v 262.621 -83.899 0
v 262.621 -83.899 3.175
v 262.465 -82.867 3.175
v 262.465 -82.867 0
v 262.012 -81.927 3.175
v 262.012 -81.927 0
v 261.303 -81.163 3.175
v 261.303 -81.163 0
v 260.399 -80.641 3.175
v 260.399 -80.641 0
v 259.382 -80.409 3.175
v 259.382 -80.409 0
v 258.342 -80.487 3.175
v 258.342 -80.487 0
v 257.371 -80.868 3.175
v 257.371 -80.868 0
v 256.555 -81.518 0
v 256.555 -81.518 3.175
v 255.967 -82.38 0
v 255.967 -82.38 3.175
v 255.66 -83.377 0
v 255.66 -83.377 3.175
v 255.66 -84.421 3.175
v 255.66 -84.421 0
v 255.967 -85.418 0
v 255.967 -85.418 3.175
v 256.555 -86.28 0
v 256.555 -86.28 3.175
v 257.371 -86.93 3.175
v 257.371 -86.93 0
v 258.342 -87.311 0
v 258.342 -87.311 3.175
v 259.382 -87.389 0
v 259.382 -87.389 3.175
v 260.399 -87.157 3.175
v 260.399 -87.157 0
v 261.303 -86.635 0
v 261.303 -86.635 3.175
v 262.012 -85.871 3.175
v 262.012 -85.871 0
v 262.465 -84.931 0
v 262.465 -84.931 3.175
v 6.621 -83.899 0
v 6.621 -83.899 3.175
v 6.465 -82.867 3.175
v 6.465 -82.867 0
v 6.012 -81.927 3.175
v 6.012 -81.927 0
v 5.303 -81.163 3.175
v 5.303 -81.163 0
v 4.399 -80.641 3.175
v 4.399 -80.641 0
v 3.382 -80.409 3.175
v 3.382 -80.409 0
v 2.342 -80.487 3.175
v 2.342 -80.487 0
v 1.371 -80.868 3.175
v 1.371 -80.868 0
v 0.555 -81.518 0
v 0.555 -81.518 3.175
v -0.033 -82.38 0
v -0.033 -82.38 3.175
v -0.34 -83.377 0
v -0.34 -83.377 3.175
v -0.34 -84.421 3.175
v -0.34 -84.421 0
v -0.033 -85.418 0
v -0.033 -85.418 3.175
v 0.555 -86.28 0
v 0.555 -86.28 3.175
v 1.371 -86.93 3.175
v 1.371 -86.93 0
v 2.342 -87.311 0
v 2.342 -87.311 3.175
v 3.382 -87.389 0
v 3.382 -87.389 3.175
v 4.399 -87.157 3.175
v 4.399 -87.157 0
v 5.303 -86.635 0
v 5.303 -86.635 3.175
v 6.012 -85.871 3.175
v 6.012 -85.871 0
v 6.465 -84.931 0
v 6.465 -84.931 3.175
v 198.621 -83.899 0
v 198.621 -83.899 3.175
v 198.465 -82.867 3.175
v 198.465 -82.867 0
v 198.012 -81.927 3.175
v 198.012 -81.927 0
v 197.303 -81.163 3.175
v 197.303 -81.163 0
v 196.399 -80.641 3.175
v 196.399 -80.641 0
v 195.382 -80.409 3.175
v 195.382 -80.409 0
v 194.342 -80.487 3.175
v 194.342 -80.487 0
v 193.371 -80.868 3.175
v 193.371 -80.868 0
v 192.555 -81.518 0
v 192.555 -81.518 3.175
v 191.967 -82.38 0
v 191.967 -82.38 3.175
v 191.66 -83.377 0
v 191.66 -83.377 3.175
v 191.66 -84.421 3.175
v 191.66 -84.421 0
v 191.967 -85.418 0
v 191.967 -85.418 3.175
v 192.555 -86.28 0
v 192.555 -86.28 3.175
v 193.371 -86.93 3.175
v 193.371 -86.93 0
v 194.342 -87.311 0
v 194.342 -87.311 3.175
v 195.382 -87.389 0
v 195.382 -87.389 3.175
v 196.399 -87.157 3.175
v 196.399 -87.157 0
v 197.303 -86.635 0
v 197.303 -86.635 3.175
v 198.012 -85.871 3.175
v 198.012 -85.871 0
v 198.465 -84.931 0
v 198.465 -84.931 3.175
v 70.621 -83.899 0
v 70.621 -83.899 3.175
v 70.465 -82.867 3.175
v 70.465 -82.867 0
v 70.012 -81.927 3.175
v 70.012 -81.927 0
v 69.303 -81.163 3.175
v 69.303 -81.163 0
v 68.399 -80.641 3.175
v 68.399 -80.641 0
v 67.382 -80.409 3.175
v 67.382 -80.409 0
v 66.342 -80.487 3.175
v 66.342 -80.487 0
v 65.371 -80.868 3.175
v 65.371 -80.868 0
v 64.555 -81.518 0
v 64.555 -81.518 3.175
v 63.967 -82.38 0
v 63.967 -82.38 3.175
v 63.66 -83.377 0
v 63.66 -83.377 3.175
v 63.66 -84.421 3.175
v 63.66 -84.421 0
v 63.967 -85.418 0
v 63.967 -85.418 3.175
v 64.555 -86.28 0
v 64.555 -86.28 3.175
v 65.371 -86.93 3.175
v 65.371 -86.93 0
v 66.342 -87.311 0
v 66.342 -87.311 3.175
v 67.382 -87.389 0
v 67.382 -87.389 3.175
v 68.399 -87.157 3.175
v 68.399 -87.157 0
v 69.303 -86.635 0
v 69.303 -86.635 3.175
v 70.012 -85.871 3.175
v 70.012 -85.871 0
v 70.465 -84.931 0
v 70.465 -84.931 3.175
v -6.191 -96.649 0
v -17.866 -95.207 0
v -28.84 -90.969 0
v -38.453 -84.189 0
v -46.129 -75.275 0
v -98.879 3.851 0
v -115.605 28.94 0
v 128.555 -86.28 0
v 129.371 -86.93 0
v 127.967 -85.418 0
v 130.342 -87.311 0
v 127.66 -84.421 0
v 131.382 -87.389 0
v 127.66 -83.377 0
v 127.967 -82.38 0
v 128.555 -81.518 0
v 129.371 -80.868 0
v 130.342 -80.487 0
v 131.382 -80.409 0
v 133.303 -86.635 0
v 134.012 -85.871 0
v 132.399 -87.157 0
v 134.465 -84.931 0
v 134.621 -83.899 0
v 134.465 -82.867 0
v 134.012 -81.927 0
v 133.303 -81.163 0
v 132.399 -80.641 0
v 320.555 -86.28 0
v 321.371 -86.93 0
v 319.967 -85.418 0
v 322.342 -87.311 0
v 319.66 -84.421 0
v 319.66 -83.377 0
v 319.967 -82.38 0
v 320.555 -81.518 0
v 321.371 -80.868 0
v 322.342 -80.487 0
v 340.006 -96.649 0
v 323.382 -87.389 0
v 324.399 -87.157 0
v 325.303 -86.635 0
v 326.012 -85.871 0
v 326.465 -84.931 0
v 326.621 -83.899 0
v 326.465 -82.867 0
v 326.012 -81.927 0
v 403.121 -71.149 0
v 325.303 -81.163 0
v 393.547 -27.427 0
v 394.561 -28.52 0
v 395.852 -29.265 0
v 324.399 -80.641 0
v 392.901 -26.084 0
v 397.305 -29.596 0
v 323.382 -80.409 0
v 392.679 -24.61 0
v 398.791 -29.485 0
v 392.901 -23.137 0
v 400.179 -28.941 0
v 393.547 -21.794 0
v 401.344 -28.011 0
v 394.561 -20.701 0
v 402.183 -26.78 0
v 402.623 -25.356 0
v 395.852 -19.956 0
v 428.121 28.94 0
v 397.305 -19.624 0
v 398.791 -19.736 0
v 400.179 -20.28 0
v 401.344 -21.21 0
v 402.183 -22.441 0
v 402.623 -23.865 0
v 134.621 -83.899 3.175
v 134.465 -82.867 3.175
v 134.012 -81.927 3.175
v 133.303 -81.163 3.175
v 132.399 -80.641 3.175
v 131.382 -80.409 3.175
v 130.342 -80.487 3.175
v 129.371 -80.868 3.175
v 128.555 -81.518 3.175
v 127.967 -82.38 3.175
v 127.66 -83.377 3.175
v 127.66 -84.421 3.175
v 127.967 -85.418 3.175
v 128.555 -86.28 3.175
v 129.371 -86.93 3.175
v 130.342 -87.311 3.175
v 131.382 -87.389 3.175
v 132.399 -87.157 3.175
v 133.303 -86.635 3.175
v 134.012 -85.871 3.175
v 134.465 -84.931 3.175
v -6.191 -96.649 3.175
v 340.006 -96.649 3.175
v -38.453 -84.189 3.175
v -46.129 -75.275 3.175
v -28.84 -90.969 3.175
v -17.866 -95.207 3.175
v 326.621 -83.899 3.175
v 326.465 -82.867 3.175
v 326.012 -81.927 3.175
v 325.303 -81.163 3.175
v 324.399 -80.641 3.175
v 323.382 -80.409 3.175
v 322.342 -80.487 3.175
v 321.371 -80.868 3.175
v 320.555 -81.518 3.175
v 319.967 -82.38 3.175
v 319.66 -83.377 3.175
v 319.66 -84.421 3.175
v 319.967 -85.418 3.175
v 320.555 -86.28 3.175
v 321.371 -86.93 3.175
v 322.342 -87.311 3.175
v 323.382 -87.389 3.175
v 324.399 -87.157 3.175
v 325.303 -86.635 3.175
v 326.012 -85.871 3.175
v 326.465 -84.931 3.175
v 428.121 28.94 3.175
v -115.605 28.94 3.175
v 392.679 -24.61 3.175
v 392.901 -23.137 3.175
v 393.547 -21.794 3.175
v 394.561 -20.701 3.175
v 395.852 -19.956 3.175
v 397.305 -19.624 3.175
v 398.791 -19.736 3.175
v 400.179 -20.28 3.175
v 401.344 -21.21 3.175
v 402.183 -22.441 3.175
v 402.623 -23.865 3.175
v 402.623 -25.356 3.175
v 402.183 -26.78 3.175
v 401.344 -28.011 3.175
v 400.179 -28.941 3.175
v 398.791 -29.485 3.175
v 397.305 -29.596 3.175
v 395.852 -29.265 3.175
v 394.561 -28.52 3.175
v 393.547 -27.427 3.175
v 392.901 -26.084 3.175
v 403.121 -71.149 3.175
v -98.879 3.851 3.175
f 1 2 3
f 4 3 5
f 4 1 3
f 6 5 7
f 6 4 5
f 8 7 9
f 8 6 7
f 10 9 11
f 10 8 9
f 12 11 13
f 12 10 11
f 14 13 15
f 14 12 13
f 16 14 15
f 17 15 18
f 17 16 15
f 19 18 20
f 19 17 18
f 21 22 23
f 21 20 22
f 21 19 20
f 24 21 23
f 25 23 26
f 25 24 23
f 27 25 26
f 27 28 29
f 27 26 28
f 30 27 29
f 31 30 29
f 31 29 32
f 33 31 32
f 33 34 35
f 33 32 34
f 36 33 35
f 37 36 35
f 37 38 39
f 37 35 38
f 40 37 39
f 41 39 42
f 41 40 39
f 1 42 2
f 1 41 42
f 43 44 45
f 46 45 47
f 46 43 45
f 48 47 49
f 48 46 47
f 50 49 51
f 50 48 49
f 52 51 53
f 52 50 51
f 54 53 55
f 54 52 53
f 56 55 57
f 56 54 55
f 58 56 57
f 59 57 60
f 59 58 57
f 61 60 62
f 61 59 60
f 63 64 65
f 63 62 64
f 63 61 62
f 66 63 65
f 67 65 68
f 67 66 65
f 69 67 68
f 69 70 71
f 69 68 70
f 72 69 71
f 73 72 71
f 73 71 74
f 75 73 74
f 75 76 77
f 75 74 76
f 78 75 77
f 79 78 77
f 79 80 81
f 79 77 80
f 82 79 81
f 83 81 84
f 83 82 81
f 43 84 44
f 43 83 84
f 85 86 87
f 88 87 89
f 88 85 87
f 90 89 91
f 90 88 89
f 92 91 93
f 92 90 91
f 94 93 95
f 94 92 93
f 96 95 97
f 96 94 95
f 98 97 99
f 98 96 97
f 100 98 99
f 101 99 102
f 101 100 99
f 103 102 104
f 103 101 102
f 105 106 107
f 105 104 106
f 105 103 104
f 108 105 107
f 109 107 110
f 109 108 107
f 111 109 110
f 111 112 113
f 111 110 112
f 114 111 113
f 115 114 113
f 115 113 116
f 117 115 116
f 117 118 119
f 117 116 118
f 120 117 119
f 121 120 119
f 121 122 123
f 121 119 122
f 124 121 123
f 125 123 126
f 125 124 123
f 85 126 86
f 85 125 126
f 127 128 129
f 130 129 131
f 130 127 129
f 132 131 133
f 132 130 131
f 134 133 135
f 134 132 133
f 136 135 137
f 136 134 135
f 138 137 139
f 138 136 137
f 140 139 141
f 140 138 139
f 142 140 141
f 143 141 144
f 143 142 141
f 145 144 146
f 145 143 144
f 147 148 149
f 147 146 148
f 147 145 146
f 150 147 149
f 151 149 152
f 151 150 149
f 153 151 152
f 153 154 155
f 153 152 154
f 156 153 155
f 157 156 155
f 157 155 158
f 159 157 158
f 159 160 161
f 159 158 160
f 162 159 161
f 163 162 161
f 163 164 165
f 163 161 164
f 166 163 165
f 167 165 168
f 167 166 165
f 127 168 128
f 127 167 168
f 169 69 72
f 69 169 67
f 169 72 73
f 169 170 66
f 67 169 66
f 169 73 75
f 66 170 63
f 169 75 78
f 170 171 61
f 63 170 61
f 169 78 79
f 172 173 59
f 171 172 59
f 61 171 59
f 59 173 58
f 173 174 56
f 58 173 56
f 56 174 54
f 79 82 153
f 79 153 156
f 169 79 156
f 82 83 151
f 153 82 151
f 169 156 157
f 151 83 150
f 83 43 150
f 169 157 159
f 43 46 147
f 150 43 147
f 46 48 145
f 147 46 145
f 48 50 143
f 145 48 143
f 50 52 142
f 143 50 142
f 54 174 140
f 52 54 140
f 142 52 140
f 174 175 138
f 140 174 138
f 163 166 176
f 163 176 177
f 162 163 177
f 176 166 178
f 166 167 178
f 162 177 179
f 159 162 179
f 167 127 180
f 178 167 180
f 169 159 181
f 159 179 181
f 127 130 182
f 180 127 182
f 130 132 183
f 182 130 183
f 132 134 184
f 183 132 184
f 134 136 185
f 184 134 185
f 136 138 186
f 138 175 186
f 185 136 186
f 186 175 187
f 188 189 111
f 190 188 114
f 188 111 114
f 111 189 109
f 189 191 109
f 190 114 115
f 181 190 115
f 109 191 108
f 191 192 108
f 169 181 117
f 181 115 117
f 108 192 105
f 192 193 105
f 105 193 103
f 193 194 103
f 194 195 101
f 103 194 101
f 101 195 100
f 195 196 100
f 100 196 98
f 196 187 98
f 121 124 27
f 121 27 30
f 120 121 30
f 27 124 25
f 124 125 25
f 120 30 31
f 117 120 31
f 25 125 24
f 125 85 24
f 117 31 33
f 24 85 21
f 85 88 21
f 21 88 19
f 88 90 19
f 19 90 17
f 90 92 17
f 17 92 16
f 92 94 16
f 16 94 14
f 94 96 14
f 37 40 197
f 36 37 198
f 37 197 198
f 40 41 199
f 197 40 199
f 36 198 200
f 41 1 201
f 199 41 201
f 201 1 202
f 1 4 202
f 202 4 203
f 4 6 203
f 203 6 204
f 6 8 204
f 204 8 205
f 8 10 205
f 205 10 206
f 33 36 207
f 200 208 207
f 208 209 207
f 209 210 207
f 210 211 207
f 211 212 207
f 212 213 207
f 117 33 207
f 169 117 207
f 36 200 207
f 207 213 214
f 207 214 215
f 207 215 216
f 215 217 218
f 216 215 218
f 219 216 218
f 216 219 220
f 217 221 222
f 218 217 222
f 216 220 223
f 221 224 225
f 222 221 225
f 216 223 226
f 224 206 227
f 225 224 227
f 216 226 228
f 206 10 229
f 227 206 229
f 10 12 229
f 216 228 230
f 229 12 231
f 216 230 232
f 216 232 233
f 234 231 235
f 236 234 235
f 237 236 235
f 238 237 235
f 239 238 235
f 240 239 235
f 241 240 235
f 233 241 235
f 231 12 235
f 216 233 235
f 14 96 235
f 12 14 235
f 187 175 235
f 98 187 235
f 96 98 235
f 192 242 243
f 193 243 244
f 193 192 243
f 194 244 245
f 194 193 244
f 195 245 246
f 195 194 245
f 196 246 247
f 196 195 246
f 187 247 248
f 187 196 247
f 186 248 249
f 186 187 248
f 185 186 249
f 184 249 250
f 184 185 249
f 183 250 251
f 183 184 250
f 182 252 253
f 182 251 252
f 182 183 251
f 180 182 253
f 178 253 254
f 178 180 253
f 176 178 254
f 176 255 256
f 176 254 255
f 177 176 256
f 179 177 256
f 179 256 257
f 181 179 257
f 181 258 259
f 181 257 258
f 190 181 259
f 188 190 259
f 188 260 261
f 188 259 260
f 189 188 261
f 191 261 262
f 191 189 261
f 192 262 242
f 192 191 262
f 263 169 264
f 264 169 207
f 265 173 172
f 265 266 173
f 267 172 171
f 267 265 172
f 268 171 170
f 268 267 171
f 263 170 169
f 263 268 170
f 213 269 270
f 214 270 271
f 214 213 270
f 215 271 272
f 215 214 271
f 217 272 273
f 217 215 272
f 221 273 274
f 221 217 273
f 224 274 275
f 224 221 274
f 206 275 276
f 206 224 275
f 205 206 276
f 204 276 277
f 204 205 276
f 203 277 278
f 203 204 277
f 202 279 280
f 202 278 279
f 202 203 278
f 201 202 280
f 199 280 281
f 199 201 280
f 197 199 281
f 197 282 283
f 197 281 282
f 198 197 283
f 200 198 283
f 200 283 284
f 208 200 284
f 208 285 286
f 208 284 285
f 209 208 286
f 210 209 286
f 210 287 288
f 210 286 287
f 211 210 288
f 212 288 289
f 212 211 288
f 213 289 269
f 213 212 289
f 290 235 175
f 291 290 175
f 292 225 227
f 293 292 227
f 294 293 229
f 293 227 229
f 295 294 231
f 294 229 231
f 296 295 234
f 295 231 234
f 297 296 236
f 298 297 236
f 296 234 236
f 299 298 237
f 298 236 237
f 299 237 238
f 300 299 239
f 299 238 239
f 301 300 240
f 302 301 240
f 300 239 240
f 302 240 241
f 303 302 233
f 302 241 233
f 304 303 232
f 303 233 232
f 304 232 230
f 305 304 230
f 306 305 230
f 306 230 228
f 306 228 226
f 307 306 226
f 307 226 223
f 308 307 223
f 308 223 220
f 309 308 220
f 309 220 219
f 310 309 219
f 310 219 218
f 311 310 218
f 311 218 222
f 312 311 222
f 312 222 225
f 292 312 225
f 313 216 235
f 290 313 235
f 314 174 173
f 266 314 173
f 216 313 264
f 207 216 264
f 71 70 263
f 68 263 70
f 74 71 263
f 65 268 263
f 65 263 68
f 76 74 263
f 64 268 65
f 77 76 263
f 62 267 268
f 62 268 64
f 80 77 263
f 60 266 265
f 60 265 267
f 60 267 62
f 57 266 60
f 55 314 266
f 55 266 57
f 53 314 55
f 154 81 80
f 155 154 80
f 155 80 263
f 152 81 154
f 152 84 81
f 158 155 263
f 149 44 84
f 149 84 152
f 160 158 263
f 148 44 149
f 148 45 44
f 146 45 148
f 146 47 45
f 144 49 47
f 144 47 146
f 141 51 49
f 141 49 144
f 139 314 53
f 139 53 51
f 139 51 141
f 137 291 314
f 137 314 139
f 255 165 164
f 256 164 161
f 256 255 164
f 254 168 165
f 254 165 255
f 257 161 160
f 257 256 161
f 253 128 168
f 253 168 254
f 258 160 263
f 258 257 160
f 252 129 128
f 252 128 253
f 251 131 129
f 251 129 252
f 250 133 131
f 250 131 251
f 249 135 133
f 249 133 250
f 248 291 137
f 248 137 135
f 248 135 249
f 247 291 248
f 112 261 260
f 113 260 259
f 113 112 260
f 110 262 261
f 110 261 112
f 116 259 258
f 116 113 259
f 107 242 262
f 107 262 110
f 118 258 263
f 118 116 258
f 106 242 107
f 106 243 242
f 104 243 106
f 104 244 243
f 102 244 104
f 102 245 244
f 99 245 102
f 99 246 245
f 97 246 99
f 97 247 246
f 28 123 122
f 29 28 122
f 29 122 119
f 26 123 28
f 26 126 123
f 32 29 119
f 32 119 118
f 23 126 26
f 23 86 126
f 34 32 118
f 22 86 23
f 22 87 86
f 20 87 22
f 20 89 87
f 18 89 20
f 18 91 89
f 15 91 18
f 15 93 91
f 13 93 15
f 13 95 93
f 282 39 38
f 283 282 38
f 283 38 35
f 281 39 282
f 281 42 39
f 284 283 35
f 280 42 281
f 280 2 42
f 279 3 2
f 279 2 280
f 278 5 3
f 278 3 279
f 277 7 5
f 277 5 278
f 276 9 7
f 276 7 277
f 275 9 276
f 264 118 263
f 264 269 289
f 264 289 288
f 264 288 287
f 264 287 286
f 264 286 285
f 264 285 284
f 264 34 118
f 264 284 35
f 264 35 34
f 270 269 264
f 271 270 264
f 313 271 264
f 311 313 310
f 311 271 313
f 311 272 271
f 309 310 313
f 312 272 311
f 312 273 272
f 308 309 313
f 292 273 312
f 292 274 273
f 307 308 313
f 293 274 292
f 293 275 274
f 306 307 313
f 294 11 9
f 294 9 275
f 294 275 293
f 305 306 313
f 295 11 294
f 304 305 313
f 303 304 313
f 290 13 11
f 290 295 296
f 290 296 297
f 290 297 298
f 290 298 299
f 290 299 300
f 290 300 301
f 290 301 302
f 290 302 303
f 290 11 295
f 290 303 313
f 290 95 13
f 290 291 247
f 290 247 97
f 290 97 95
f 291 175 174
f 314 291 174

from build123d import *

# Parameters (mm, degrees)
BOSS_EXTRUDE1_DEPTH = 3.175
SKETCH1_4_R         = 3.5
CUT_EXTRUDE1_DEPTH  = 439.905857431
FILLET1_R           = 48
CUT_EXTRUDE3_DEPTH  = 10
CUT_EXTRUDE5_REACH  = 440.906
SKETCH11_R          = 5


with BuildPart() as part:
    # Sketch1 → Boss-Extrude1 (new body)
    with BuildSketch(Plane.XY):
        Polygon((-98.879411765, 3.850980392), (-31.879411765, -96.649019608), (366, -96.649019608), (403.120588235, -71.149019608), (428.120588235, 28.939617947), (-115.605170134, 28.939617947), align=None)
    extrude(amount=BOSS_EXTRUDE1_DEPTH)

    # Sketch1<4> → Cut-Extrude1 (cut, through all)
    with BuildSketch(Plane.XY):
        with Locations((3.120588235, -83.899019608)):
            Circle(SKETCH1_4_R)
        with Locations((67.120588235, -83.899019608)):
            Circle(SKETCH1_4_R)
        with Locations((131.120588235, -83.899019608)):
            Circle(SKETCH1_4_R)
        with Locations((195.120588235, -83.899019608)):
            Circle(SKETCH1_4_R)
        with Locations((259.120588235, -83.899019608)):
            Circle(SKETCH1_4_R)
        with Locations((323.120588235, -83.899019608)):
            Circle(SKETCH1_4_R)
    extrude(amount=CUT_EXTRUDE1_DEPTH, mode=Mode.SUBTRACT)

    # Fillet1
    fillet1_edges = [part.edges().sort_by_distance(p)[0] for p in [
        (-31.879411765, -96.649019608, 1.5875),
    ]]
    fillet(fillet1_edges, radius=FILLET1_R)

    # Sketch7 → Cut-Extrude3 (cut)
    with BuildSketch(Plane.XY.offset(3.175)):
        Polygon((403.120588235, -71.149019608), (340.005873473, -96.649019608), (366, -96.649019608), align=None)
    extrude(amount=-CUT_EXTRUDE3_DEPTH, mode=Mode.SUBTRACT)

    # Sketch11 → Cut-Extrude5 (cut, up to next)
    with BuildSketch(Plane(origin=(0, 0, 0), x_dir=(-1, 0, 0), z_dir=(0, 0, -1)), mode=Mode.PRIVATE) as cut_extrude5_sk1:
        with Locations((-397.678558137, -24.610405219)):
            Circle(SKETCH11_R)
    cut_extrude5_tool1 = extrude(cut_extrude5_sk1.sketch, amount=-CUT_EXTRUDE5_REACH, mode=Mode.PRIVATE) & part.part
    add(cut_extrude5_tool1.solids().sort_by_distance((397.678558, -24.610405, 0))[0], mode=Mode.SUBTRACT)


solid = part.part
